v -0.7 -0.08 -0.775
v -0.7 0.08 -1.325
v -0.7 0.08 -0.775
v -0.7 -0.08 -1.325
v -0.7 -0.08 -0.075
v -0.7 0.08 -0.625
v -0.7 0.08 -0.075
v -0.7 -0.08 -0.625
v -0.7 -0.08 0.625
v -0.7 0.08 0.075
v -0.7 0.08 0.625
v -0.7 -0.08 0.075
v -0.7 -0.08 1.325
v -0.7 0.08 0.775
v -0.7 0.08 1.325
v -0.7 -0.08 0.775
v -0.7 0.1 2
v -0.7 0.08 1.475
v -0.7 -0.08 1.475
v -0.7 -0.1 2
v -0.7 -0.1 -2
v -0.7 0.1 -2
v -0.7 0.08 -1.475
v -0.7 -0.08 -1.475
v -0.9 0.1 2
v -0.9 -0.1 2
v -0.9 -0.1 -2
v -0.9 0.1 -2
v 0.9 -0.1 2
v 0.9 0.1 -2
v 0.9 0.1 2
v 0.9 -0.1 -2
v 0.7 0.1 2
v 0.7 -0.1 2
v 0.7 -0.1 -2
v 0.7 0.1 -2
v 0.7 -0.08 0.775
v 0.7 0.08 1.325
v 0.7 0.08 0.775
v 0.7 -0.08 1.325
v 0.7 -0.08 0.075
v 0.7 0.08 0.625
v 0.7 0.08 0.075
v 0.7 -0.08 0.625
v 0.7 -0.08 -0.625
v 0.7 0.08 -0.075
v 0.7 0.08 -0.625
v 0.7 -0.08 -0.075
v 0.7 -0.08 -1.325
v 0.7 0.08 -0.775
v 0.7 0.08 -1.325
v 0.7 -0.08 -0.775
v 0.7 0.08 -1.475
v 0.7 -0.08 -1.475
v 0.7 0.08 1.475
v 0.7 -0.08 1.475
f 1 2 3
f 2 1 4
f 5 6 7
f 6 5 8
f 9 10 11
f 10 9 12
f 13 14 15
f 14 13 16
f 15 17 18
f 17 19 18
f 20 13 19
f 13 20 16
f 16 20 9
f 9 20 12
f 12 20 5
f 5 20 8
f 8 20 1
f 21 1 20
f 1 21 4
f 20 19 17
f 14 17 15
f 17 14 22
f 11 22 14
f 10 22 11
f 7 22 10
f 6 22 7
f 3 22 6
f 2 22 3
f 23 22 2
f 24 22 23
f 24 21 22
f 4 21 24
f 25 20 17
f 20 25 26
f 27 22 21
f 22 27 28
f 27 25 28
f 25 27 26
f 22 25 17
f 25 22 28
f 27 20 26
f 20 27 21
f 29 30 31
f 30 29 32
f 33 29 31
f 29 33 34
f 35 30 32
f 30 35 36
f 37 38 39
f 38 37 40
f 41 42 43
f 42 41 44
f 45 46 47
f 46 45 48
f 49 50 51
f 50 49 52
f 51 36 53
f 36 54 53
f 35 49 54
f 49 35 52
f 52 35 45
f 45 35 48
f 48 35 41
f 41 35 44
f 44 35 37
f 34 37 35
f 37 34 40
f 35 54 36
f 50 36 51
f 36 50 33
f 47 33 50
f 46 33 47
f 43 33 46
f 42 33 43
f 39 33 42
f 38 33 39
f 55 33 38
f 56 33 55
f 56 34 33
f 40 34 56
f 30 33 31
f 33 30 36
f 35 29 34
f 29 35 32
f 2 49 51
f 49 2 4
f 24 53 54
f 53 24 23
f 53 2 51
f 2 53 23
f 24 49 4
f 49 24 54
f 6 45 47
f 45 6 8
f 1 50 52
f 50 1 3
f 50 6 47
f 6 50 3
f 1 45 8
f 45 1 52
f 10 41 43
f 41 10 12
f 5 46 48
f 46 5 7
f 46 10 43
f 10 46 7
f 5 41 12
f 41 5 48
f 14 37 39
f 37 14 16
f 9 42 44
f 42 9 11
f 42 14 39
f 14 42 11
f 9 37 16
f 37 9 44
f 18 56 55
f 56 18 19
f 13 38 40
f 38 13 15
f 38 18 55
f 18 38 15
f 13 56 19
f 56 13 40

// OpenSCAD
module Ladder_01(){

    color("#A1662F"){
    translate([-0.8,0,0])
    cube([0.2,0.2,4], center = true);

    translate([0.8,0,0])
    cube([0.2,0.2,4], center = true);   
    }  
    color("#4d3737"){
        for(i= [-1.4:0.7:1.4]){
            translate([0,0,i])
            cube([1.6,0.16,0.15], center = true);
            }
        }
    
}

Ladder_01();
